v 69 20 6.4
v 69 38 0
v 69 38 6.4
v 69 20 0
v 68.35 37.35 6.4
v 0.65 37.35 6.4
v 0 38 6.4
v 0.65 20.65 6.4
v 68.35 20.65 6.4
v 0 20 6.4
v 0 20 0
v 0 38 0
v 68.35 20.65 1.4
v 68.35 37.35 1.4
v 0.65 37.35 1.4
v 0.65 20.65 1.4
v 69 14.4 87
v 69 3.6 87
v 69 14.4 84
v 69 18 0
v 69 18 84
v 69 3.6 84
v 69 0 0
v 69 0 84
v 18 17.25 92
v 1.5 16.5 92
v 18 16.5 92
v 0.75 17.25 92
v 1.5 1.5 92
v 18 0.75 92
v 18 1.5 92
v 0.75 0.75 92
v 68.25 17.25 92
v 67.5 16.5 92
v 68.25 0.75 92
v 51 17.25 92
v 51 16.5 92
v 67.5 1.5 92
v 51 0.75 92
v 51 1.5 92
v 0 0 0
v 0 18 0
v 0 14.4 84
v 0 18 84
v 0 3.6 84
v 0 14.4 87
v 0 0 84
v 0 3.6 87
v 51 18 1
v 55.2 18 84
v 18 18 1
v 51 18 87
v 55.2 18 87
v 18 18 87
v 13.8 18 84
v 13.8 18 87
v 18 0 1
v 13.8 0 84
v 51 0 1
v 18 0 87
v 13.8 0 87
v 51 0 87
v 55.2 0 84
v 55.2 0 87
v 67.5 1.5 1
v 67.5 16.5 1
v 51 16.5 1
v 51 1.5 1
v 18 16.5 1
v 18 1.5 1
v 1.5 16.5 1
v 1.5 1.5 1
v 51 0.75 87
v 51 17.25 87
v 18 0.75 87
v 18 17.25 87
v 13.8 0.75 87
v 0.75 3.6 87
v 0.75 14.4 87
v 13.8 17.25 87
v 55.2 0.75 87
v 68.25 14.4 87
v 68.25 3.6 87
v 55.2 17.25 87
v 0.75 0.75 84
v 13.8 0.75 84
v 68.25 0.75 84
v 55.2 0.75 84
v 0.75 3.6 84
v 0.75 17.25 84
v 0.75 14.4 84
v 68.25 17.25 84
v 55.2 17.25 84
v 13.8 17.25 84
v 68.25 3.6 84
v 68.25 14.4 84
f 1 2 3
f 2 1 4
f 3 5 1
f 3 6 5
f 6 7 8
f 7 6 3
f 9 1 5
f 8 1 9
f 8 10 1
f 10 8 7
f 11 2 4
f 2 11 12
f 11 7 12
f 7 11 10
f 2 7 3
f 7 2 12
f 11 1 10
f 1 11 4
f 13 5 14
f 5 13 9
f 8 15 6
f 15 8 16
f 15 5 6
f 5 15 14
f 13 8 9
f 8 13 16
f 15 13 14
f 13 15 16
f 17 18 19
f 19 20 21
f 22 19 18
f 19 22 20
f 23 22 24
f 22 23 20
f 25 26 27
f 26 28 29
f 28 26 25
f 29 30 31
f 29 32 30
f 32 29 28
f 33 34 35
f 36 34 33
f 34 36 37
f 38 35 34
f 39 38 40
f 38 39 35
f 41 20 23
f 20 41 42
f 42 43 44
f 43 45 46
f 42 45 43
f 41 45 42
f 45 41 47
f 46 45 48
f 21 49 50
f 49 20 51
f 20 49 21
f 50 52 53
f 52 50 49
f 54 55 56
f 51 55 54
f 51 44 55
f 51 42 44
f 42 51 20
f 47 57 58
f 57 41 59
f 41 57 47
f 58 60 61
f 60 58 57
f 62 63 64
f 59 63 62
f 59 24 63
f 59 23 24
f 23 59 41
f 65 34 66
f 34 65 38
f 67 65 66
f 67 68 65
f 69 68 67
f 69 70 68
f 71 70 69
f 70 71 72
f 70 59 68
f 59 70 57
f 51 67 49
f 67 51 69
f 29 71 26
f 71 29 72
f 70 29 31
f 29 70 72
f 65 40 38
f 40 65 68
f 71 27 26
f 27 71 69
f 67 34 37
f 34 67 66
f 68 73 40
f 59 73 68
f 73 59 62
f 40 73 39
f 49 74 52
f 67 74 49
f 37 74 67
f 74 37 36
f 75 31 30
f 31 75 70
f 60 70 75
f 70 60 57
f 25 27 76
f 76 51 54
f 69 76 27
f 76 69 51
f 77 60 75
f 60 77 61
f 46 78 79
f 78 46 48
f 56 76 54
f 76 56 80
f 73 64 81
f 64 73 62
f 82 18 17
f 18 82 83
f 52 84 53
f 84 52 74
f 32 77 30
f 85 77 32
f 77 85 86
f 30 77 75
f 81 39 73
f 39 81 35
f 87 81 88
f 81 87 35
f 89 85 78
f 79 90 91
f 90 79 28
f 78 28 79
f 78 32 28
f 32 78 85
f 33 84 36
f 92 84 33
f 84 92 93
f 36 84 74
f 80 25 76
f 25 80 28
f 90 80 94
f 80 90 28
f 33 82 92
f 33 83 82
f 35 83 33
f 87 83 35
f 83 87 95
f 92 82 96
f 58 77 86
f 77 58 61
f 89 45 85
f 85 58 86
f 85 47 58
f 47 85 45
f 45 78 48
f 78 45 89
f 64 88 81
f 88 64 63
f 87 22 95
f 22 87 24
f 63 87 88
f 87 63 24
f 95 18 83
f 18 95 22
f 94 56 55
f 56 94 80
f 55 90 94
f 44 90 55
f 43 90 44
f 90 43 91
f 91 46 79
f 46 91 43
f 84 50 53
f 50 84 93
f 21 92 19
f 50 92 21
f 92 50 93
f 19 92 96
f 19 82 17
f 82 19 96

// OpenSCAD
include <boardgame_insert_toolkit_lib.1.18.scad>;

// determines whether lids are output.
g_b_print_lid = 1;

// determines whether boxes are output.
g_b_print_box = 1; 

// Focus on one box
g_isolated_print_box = ""; 

// Used to visualize how all of the boxes fit together. 
// Turn off for printing.
g_b_visualization = 0;          

// Makes solid simple lids instead of the honeycomb ones.
// Might be faster to print. Definitely faster to render.
g_b_simple_lids = 1;            


// creates the indentation on the bottom of the box 
//that allows the lid to be put under when in play.
g_b_fit_lid_underneath = 0; 

// this is the outer wall thickness. 
//Default = 1.5
g_wall_thickness = 1.5;

// this is the thickness of partitions between compartments
// Default = 1
g_partition_thickness = 1.0;

// this is the width of partitions that are for 
// inserting fingers to grab the bits.
// default = 13
g_finger_partition_thickness = 13;
 

// 285 x 285 x 50
data =
[
    [   "cards",
        [
            [ "box_dimensions", [69, 18, 92] ],                       // float f -- default:[ 100, 100, 100 ]
            [ "label",
                [
            //        [ "text",   "Tussie Mussie"],
                    [ "size",   6 ],
                    ["rotation",                        0 ],
                ]
            ],
            
            [   "components",
                [
                    [   "cards",
                        [
                            ["enabled",                         1 ],                        // true | false
                            ["type",                            "cards"],                   // "cards" | "tokens" | "chit_stack" | "chit_stack_vertical" | "" -- default: ""
                            ["shape",                           ""],                 // "round" | "hex" | "hex_rotated" | "square" -- default: "square"
                            ["compartment_size",                [ 66, 15, 91] ],      // [float, float, float]
                    // [float,float]
                            ["position",                        ["center", "center" ] ],                // [float, float, float]
                            ["rotation",                        0 ],
                        ]
                    ],
                ]
            ]
        ]
    ],

 
    
];


MakeAll();
